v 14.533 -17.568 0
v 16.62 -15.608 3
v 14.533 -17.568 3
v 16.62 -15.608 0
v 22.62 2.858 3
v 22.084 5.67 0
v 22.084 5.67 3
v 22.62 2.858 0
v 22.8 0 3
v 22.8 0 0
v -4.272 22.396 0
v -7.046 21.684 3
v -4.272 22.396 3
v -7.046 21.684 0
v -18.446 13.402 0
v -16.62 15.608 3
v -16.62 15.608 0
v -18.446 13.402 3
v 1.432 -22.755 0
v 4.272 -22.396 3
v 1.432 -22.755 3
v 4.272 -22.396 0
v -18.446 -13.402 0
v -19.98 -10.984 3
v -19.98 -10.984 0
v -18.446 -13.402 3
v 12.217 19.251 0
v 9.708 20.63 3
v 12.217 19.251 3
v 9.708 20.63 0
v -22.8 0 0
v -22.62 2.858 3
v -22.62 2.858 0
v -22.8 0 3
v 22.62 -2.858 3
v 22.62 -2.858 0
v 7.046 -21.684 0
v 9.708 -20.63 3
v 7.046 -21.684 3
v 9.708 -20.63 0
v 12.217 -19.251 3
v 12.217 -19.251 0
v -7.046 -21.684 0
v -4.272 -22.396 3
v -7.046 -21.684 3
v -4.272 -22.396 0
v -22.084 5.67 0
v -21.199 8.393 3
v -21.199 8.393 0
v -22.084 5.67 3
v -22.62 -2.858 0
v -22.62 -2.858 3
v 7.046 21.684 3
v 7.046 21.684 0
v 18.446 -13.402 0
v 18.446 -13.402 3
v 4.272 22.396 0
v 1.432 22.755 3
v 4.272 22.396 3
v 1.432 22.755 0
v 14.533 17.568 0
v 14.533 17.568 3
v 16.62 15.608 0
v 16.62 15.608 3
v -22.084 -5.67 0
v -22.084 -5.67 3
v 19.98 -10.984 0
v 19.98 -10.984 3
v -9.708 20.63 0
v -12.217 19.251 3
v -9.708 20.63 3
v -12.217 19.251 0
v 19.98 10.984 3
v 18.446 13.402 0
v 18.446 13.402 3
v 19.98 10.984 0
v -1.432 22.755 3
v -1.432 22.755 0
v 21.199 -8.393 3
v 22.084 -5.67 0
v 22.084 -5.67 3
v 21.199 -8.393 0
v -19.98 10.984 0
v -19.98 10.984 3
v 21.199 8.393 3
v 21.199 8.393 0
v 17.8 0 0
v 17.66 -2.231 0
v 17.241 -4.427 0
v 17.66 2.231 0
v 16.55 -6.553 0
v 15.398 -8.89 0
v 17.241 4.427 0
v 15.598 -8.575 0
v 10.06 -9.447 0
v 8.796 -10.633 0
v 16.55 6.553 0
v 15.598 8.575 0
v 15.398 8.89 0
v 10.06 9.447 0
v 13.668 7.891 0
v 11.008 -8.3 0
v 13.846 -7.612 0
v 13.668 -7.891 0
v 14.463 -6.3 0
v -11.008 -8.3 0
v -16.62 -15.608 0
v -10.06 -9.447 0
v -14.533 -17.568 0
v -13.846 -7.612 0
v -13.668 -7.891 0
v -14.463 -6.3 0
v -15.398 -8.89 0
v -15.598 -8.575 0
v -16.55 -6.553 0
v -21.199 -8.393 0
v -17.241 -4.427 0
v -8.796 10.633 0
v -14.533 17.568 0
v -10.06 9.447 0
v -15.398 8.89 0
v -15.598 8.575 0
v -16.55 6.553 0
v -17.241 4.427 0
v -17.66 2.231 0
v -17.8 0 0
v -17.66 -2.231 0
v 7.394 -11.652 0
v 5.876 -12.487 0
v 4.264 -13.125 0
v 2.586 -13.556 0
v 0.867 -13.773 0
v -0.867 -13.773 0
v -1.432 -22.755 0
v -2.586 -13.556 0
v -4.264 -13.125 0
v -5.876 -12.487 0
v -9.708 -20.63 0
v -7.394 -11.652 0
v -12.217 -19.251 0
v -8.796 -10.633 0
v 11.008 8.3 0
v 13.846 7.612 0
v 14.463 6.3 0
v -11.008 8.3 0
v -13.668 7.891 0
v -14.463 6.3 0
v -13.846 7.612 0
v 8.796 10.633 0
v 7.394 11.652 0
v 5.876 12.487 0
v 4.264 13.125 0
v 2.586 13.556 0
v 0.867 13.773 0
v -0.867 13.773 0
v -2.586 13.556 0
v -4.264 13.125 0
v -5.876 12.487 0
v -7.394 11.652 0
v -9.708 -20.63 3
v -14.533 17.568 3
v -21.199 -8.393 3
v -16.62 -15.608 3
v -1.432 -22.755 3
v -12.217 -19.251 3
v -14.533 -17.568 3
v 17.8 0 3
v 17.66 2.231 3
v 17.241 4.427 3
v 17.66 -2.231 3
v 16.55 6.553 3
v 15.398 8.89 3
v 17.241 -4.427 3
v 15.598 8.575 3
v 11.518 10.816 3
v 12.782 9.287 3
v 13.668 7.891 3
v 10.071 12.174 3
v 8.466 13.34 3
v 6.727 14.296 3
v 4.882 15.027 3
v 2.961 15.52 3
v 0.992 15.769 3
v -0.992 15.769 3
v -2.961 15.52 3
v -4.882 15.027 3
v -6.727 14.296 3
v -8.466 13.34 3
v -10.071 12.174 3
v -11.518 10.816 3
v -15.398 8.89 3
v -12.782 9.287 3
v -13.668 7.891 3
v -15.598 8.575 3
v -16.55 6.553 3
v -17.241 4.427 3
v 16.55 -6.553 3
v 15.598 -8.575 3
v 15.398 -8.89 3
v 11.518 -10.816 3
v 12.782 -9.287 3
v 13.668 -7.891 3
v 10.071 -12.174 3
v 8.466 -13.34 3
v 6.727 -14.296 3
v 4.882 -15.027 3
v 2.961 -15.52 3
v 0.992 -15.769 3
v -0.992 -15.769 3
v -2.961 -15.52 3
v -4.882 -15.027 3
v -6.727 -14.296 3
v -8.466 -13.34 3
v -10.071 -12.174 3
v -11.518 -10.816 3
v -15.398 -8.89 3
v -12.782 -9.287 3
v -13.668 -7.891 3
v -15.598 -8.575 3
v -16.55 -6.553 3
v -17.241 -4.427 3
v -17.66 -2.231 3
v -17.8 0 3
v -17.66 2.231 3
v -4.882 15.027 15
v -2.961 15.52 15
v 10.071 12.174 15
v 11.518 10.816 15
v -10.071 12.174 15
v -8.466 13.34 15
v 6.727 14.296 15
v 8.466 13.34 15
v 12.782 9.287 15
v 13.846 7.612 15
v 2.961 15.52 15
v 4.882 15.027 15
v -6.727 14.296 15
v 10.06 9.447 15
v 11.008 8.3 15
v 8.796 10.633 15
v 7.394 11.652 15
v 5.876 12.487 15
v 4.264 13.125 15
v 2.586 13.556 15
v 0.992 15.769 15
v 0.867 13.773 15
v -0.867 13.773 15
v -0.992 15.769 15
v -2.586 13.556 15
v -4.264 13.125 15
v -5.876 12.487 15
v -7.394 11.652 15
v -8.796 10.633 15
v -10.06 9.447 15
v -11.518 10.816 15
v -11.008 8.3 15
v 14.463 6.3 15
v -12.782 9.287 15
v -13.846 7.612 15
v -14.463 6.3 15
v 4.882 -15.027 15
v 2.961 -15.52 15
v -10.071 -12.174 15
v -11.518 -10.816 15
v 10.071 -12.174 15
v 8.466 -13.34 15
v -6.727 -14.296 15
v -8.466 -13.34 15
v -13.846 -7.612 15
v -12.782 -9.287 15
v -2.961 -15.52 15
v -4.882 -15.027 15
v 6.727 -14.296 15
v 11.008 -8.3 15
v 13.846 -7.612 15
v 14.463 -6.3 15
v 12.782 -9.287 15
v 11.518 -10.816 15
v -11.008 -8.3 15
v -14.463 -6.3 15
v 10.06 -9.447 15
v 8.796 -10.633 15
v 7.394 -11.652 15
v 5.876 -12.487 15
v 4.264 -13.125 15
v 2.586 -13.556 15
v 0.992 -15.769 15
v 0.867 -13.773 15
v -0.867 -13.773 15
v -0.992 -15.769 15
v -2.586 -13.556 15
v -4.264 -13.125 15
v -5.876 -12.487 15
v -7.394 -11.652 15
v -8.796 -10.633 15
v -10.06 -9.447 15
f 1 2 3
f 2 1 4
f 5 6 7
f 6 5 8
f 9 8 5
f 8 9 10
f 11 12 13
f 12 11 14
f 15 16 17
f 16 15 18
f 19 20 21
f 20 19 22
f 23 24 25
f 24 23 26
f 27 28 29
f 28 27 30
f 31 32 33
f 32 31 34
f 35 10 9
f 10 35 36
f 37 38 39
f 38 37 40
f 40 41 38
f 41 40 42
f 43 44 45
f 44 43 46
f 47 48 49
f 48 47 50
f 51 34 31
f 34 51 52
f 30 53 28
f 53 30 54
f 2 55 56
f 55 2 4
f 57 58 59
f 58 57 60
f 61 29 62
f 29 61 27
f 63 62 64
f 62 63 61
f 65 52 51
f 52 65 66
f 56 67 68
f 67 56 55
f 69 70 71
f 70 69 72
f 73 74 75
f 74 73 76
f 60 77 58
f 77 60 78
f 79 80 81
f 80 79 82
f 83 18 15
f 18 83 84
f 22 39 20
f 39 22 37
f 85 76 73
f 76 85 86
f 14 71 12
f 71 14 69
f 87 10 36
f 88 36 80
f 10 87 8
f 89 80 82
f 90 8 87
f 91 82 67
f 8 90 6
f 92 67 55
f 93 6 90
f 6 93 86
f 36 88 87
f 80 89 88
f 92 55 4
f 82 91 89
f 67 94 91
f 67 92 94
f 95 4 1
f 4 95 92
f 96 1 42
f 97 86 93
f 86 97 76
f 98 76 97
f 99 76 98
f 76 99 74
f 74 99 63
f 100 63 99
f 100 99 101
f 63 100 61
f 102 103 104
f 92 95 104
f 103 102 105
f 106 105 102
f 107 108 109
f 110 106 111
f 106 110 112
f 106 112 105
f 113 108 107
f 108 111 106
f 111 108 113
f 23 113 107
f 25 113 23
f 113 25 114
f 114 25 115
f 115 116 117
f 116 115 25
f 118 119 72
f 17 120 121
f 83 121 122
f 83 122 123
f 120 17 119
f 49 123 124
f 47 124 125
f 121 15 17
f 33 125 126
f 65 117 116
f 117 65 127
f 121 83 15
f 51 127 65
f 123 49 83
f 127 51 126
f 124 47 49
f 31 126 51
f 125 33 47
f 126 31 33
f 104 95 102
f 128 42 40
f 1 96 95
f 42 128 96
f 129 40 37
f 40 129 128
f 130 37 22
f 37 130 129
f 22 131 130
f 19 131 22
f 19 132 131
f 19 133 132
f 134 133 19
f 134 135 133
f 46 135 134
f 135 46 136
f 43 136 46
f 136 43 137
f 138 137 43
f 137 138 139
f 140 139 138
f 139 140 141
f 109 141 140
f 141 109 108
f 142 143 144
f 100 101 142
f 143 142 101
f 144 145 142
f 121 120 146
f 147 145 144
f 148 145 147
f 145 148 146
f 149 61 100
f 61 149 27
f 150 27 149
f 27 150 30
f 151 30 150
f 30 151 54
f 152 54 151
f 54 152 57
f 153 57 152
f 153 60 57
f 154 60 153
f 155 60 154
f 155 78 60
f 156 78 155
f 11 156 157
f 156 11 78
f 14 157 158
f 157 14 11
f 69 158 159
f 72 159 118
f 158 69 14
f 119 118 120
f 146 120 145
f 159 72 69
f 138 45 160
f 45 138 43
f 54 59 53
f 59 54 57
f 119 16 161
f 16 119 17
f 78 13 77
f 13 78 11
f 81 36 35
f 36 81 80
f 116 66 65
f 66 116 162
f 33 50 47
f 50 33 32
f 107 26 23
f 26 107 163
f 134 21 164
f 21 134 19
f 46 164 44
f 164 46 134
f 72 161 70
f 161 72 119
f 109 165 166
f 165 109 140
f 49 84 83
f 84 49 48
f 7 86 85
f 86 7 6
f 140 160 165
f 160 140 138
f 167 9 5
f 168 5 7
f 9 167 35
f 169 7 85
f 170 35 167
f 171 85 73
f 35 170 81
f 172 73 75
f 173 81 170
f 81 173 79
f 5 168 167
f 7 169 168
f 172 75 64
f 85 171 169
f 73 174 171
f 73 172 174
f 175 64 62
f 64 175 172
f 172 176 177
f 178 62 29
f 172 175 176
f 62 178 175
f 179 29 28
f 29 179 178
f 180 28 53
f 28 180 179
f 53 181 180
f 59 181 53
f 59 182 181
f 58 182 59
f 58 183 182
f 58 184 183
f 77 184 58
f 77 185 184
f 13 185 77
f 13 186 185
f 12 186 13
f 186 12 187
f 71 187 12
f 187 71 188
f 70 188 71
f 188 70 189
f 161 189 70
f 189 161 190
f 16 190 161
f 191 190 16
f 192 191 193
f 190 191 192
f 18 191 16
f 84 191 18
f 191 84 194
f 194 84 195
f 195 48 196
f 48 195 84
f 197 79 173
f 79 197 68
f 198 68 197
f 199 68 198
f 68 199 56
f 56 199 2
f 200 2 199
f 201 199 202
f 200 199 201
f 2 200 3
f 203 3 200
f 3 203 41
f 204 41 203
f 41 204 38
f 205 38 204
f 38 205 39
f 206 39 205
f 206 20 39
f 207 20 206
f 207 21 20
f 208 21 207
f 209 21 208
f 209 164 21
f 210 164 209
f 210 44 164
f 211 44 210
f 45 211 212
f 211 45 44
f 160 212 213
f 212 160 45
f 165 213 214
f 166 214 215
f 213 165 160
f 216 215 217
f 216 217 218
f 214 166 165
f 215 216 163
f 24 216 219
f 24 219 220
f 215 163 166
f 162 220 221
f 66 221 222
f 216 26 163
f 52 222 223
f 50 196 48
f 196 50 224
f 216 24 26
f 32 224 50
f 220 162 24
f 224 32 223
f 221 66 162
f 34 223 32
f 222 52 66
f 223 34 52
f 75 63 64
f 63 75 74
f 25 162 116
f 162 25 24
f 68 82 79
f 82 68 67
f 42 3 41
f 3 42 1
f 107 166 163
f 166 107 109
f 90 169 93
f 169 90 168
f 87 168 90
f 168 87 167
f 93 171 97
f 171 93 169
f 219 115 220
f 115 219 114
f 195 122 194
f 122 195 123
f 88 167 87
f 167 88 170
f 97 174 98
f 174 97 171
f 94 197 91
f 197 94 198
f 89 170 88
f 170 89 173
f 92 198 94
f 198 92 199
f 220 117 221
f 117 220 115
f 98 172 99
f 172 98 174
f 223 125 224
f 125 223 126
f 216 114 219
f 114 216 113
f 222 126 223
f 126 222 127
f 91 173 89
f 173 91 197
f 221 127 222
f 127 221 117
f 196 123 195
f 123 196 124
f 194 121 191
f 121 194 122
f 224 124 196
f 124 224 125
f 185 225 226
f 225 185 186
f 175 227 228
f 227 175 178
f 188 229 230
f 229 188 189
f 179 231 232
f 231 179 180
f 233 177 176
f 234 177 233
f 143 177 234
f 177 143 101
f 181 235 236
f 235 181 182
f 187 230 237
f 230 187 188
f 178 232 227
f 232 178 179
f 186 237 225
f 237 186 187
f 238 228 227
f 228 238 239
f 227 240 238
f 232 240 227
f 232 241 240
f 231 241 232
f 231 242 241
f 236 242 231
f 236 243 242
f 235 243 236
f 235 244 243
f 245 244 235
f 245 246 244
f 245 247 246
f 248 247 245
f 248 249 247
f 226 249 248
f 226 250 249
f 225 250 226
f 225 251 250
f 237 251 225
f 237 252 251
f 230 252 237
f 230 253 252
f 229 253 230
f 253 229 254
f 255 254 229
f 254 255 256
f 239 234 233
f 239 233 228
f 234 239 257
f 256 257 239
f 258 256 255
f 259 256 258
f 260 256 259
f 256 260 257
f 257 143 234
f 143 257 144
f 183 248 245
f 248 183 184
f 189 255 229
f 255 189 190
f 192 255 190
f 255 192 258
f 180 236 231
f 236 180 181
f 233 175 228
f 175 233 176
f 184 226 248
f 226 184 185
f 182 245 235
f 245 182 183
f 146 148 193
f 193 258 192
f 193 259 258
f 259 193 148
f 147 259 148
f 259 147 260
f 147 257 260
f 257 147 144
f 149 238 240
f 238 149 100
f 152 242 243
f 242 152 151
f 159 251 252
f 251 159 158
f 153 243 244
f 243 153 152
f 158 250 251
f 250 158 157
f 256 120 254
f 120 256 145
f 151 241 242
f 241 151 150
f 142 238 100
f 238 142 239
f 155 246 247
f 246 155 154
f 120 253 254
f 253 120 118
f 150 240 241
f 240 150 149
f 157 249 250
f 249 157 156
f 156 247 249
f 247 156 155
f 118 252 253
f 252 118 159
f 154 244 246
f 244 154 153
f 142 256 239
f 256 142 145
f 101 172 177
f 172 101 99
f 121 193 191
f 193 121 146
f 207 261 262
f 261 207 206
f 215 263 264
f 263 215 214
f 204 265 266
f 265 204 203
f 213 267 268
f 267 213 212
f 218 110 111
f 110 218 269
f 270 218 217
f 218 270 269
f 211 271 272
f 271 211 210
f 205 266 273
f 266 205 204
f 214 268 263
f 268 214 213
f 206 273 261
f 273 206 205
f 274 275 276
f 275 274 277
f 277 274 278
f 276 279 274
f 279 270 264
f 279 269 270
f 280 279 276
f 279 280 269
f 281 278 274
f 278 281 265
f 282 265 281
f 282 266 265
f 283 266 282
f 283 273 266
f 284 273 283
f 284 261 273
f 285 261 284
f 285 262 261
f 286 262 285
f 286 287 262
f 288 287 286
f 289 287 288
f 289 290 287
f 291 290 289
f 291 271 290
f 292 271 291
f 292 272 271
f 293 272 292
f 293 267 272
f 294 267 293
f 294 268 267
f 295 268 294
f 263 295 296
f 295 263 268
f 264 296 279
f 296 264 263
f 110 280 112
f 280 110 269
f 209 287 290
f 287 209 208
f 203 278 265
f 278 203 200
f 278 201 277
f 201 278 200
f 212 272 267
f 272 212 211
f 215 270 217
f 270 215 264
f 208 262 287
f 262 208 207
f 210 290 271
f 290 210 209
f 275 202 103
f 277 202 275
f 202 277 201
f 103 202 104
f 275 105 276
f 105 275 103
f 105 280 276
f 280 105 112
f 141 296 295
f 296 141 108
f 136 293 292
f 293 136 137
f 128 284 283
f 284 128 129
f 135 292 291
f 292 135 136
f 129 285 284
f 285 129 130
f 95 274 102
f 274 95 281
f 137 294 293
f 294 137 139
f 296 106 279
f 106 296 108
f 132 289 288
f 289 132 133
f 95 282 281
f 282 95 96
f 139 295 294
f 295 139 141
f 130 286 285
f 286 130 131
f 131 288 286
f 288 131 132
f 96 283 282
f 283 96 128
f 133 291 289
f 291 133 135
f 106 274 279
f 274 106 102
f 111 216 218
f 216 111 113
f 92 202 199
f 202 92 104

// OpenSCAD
// file: params.scad
$fn = 50;

empty_distance = 1;
pelton_diameter = 33.6;
pelton_radius = pelton_diameter / 2;
middle_thickness = 10.6;
common_thickness = 2;
big_value = 100;
depth = 15;
ring_thickness = 5;
ring_depth = 3;
// main file
include <params.scad>;

module put_rotated_2(){
	for(i = [0:$children-1])
		child(i);
	rotate([0, 0, 180])
		for(i = [0:$children-1])
			child(i);
}

module half_part(radius, distance_to_center){
	difference(){
		cylinder(depth, radius, radius);
		translate([-radius, -radius, 0])
			cube([radius * 4, distance_to_center + radius, depth]);
	}
}

module half_hollow_part(radius, distance_to_center, thickness){
	difference(){
		half_part(radius, distance_to_center);
		half_part(radius - thickness, distance_to_center + thickness);
	}
}

module ring(radius, thickness, depth){
	difference(){
		cylinder(depth, radius + thickness, radius + thickness);
		cylinder(depth, radius, radius);
	}
}

module half_ring(radius, thickness, depth){
	difference(){
		ring(radius, thickness, depth);
		rotate([0, 0, 180])
			translate([-radius - thickness, 0, 0])
				cube([(radius + thickness) * 2, radius + thickness, depth]);
	}
}

module ring_for_angle(radius, thickness, depth, angle){
	rotate_angle = 90 - angle / 2;
	intersection(){
		rotate([0, 0, rotate_angle])
			half_ring(radius, thickness, depth);
		rotate([0, 0, -rotate_angle])
			half_ring(radius, thickness, depth);
	}
}

ring(pelton_radius + empty_distance, ring_thickness, ring_depth);
put_rotated_2(){
	union(){
		half_hollow_part(pelton_radius - empty_distance, (middle_thickness / 2) + empty_distance, common_thickness);
		ring_for_angle(pelton_radius - empty_distance * 2, empty_distance * 4, ring_depth, 120);
	}
}

//ring_for_angle(pelton_radius - empty_distance, empty_distance * 2, ring_depth, 120);
